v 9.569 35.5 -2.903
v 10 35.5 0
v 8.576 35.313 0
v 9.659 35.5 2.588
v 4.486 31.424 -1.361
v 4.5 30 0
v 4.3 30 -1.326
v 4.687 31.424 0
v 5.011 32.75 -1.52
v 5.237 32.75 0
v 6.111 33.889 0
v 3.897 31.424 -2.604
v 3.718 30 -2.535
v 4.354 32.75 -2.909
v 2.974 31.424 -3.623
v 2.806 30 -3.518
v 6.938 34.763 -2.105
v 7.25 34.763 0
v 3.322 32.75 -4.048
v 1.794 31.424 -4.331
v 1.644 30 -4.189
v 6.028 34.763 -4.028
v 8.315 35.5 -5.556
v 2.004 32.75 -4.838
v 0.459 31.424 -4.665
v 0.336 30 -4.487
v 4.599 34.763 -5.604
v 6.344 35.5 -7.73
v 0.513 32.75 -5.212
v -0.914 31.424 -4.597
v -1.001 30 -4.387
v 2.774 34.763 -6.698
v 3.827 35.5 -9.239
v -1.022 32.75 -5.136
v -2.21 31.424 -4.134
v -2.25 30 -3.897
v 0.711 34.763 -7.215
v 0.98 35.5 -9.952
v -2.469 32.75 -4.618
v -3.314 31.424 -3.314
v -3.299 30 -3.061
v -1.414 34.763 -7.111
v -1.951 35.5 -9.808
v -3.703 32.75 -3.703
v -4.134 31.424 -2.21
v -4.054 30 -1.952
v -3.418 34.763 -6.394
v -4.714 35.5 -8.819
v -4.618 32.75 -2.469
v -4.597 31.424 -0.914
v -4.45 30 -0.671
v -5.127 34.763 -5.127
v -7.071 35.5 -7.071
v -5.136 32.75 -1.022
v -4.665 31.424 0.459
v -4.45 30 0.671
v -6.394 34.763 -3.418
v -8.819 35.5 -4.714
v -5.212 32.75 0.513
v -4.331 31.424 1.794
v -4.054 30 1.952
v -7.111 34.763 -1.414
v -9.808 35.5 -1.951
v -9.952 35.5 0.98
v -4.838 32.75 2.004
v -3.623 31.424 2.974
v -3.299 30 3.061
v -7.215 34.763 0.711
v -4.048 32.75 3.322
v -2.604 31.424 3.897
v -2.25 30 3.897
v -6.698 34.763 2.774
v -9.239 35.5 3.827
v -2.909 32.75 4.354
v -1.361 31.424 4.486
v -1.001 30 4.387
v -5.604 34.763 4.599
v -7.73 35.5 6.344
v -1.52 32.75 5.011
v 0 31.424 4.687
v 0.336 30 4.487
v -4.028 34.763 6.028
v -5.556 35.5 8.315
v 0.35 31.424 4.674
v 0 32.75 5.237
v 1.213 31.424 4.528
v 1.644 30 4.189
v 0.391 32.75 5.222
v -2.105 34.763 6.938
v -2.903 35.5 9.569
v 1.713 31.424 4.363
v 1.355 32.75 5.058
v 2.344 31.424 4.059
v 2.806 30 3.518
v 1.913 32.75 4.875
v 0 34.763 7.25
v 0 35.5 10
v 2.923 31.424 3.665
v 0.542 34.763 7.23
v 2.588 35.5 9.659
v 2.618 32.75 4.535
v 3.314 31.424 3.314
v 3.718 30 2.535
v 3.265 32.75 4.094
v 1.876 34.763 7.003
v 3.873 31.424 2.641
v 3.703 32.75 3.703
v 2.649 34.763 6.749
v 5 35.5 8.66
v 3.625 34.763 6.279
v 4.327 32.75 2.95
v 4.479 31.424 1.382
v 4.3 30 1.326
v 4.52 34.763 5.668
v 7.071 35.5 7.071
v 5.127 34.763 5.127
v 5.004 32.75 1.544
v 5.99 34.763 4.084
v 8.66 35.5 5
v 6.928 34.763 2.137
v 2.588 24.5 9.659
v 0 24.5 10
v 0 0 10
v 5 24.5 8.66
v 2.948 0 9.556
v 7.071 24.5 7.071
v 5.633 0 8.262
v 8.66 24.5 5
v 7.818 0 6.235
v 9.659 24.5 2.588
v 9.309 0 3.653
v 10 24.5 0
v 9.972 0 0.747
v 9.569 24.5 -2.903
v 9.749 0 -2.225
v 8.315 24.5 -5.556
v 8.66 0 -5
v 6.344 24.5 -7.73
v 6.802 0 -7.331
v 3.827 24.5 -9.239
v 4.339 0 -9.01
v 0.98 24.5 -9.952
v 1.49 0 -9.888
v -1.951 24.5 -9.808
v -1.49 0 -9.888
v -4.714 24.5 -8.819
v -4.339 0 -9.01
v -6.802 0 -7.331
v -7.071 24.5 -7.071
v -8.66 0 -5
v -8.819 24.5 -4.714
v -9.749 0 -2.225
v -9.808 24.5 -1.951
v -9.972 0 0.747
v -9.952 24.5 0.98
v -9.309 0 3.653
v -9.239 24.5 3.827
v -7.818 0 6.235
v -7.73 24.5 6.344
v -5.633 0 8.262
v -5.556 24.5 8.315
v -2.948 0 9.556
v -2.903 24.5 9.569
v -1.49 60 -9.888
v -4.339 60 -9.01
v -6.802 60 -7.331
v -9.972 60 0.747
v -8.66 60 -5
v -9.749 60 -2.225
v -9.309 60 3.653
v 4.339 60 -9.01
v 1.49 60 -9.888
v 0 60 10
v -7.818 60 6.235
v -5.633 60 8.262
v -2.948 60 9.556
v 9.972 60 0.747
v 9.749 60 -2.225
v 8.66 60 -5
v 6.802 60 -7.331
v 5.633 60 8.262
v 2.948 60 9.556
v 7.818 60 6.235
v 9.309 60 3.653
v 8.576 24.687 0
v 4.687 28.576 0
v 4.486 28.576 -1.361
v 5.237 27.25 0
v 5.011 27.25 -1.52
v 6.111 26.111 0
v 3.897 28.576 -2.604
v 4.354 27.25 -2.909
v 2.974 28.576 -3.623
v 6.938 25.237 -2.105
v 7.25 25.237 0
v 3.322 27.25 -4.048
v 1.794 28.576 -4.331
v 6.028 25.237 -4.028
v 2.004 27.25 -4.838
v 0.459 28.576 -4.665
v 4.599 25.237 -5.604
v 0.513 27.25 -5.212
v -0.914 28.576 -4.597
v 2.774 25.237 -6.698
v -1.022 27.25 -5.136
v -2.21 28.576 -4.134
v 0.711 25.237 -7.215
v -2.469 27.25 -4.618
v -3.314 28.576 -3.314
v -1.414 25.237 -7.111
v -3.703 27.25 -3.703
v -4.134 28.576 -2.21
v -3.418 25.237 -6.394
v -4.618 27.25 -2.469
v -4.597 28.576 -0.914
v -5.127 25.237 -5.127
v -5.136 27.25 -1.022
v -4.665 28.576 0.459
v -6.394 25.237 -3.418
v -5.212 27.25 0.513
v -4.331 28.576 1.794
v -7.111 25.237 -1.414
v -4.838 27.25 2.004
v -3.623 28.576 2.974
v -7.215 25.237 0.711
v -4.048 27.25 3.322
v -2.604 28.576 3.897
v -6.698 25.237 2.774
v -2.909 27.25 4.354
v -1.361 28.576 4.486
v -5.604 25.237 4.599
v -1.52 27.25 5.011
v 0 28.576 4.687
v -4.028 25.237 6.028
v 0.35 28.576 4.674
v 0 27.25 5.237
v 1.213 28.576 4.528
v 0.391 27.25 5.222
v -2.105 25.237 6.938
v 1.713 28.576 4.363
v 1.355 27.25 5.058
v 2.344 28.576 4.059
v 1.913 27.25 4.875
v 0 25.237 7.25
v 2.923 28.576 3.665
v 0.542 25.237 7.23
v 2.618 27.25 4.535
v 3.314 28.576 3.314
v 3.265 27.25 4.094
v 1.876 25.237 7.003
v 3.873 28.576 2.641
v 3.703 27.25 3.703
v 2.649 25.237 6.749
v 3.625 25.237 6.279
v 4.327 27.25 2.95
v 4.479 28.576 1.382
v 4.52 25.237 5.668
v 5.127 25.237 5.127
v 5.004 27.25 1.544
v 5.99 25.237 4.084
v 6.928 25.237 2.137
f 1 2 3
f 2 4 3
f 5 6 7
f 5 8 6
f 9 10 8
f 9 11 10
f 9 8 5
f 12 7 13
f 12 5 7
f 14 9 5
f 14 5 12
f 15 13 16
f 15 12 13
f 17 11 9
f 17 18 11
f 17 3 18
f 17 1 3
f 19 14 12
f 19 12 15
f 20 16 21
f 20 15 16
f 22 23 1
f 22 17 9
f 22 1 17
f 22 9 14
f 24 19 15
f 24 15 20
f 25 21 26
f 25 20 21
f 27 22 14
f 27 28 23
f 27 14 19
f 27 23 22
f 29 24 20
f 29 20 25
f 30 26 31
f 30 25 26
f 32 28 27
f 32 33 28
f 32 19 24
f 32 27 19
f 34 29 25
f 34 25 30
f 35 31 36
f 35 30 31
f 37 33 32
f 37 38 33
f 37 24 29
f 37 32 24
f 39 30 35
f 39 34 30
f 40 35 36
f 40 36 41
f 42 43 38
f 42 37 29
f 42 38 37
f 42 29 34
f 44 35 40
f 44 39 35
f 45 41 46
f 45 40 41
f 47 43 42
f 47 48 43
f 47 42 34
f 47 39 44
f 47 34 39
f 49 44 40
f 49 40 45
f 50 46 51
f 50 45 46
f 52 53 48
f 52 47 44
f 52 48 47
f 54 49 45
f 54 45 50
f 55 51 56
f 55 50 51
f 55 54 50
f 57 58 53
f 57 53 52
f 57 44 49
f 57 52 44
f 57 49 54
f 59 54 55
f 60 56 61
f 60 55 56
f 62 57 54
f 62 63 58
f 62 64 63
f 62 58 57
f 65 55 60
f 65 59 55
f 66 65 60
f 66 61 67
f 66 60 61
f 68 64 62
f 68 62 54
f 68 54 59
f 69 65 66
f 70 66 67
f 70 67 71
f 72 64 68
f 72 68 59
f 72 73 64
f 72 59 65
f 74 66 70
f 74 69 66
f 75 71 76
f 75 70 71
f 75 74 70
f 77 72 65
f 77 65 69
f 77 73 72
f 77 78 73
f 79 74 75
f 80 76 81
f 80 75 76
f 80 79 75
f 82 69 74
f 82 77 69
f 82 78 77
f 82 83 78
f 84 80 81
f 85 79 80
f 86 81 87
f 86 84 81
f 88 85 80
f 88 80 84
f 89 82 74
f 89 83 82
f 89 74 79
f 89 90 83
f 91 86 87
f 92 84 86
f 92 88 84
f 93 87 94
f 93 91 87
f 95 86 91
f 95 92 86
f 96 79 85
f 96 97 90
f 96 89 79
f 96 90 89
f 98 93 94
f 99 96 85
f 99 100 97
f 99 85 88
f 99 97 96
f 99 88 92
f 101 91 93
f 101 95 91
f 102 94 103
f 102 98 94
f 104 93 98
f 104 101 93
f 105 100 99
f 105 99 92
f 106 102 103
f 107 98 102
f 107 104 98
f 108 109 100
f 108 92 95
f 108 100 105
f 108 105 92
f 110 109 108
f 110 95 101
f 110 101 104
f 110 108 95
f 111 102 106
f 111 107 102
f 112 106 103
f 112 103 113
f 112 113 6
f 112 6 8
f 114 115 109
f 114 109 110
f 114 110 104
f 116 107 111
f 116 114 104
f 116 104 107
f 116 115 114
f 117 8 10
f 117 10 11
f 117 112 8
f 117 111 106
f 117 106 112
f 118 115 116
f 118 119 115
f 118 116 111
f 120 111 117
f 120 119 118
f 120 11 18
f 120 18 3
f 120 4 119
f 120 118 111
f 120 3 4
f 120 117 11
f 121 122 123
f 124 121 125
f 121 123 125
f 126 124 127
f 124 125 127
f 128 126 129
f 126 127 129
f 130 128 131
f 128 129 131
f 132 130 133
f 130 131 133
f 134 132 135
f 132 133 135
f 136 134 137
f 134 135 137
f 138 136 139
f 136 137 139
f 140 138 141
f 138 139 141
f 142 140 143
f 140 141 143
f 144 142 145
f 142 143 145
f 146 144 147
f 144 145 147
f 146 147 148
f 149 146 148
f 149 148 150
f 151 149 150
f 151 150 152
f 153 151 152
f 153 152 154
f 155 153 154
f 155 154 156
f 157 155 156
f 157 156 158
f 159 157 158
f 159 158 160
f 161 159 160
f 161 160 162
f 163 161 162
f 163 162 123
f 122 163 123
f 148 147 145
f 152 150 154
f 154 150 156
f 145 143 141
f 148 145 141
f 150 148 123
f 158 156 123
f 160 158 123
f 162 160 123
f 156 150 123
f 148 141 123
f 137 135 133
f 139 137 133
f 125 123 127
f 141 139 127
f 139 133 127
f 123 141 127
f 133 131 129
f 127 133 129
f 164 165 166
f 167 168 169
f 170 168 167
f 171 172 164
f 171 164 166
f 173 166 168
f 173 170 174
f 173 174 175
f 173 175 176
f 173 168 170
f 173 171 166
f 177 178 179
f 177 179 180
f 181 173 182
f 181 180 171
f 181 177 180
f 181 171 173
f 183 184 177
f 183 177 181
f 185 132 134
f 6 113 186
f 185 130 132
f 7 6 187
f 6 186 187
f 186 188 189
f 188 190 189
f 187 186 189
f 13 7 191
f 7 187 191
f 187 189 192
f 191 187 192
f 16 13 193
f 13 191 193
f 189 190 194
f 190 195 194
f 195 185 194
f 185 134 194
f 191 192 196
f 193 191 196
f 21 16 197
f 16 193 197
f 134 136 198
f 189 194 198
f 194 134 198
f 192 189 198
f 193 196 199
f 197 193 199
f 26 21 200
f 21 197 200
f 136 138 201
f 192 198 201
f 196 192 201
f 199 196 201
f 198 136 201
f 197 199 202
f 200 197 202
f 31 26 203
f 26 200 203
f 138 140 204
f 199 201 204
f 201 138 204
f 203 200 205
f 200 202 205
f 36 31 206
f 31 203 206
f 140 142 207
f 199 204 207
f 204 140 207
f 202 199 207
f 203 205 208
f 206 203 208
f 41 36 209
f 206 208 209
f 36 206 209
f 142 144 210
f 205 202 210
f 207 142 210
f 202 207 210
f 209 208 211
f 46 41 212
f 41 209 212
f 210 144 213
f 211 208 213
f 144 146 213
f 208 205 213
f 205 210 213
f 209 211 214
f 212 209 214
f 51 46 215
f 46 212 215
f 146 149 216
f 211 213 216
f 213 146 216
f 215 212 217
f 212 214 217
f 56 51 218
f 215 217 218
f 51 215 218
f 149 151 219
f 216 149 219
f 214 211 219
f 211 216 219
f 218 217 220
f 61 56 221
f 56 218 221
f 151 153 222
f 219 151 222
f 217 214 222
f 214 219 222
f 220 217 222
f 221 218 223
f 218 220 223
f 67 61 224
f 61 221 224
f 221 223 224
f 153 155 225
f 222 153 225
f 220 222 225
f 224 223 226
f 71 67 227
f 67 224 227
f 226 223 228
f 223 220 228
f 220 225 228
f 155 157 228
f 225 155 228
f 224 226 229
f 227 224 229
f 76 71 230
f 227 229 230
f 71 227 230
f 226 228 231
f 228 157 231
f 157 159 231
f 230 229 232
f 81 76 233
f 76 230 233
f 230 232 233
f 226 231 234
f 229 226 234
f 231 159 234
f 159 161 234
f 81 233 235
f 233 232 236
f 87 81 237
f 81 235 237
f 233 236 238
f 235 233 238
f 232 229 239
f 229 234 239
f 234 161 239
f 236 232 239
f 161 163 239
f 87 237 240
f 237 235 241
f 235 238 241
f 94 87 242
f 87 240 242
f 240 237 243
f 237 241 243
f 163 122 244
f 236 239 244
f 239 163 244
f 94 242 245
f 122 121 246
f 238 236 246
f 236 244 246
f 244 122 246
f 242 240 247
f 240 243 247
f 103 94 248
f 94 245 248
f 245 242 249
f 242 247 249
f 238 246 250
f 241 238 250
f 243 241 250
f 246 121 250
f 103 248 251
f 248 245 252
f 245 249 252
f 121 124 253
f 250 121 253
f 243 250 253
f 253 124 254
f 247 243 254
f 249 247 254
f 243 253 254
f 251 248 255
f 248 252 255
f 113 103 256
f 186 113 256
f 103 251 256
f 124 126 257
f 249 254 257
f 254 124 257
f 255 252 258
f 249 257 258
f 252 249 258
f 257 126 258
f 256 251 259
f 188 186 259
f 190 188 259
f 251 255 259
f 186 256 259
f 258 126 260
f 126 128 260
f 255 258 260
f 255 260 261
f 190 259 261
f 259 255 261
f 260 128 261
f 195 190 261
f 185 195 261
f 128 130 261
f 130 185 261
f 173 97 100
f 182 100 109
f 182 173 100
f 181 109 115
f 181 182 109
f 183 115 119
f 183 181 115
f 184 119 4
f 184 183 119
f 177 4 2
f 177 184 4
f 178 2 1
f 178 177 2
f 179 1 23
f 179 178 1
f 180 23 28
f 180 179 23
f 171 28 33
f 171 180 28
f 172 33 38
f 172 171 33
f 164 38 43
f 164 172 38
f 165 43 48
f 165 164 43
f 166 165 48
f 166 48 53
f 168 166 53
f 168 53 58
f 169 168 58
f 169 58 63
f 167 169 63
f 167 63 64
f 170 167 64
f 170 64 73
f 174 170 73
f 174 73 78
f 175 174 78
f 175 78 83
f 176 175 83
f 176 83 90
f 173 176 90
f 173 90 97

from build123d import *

# Parameters (mm, degrees)
SKETCH1_R           = 10
BOSS_EXTRUDE1_DEPTH = 30


# Read off the part's stored shape, not the designer's step: Cut-Sweep5
with BuildPart() as part:
    # Sketch1 → Boss-Extrude1 (new body)
    with BuildSketch(Plane(origin=(0, 0, 0), x_dir=(1, 0, 0), z_dir=(0, 1, 0))):
        with Locations(Location((0, 0, 0), (0, 0, 270))):
            Circle(SKETCH1_R)
    extrude(amount=BOSS_EXTRUDE1_DEPTH)

    # Cut-Sweep5 outline → Cut-Sweep5 (revolve, cut)
    with BuildSketch(Plane.XY):
        with BuildLine():
            Line((10, 30), (4.5, 30))
            ThreePointArc((4.5, 30), (6.110912703, 26.110912703), (10, 24.5))
            Line((10, 24.5), (10, 30))
        make_face()
    revolve(axis=Axis((0, 0, 0), (0, 1, 0)), mode=Mode.SUBTRACT)

    # Mirror1: part across plane


with BuildPart() as part_1:
    add(part.part)
    add(part.part.mirror(Plane.ZX.offset(30)))


solid = part_1.part
